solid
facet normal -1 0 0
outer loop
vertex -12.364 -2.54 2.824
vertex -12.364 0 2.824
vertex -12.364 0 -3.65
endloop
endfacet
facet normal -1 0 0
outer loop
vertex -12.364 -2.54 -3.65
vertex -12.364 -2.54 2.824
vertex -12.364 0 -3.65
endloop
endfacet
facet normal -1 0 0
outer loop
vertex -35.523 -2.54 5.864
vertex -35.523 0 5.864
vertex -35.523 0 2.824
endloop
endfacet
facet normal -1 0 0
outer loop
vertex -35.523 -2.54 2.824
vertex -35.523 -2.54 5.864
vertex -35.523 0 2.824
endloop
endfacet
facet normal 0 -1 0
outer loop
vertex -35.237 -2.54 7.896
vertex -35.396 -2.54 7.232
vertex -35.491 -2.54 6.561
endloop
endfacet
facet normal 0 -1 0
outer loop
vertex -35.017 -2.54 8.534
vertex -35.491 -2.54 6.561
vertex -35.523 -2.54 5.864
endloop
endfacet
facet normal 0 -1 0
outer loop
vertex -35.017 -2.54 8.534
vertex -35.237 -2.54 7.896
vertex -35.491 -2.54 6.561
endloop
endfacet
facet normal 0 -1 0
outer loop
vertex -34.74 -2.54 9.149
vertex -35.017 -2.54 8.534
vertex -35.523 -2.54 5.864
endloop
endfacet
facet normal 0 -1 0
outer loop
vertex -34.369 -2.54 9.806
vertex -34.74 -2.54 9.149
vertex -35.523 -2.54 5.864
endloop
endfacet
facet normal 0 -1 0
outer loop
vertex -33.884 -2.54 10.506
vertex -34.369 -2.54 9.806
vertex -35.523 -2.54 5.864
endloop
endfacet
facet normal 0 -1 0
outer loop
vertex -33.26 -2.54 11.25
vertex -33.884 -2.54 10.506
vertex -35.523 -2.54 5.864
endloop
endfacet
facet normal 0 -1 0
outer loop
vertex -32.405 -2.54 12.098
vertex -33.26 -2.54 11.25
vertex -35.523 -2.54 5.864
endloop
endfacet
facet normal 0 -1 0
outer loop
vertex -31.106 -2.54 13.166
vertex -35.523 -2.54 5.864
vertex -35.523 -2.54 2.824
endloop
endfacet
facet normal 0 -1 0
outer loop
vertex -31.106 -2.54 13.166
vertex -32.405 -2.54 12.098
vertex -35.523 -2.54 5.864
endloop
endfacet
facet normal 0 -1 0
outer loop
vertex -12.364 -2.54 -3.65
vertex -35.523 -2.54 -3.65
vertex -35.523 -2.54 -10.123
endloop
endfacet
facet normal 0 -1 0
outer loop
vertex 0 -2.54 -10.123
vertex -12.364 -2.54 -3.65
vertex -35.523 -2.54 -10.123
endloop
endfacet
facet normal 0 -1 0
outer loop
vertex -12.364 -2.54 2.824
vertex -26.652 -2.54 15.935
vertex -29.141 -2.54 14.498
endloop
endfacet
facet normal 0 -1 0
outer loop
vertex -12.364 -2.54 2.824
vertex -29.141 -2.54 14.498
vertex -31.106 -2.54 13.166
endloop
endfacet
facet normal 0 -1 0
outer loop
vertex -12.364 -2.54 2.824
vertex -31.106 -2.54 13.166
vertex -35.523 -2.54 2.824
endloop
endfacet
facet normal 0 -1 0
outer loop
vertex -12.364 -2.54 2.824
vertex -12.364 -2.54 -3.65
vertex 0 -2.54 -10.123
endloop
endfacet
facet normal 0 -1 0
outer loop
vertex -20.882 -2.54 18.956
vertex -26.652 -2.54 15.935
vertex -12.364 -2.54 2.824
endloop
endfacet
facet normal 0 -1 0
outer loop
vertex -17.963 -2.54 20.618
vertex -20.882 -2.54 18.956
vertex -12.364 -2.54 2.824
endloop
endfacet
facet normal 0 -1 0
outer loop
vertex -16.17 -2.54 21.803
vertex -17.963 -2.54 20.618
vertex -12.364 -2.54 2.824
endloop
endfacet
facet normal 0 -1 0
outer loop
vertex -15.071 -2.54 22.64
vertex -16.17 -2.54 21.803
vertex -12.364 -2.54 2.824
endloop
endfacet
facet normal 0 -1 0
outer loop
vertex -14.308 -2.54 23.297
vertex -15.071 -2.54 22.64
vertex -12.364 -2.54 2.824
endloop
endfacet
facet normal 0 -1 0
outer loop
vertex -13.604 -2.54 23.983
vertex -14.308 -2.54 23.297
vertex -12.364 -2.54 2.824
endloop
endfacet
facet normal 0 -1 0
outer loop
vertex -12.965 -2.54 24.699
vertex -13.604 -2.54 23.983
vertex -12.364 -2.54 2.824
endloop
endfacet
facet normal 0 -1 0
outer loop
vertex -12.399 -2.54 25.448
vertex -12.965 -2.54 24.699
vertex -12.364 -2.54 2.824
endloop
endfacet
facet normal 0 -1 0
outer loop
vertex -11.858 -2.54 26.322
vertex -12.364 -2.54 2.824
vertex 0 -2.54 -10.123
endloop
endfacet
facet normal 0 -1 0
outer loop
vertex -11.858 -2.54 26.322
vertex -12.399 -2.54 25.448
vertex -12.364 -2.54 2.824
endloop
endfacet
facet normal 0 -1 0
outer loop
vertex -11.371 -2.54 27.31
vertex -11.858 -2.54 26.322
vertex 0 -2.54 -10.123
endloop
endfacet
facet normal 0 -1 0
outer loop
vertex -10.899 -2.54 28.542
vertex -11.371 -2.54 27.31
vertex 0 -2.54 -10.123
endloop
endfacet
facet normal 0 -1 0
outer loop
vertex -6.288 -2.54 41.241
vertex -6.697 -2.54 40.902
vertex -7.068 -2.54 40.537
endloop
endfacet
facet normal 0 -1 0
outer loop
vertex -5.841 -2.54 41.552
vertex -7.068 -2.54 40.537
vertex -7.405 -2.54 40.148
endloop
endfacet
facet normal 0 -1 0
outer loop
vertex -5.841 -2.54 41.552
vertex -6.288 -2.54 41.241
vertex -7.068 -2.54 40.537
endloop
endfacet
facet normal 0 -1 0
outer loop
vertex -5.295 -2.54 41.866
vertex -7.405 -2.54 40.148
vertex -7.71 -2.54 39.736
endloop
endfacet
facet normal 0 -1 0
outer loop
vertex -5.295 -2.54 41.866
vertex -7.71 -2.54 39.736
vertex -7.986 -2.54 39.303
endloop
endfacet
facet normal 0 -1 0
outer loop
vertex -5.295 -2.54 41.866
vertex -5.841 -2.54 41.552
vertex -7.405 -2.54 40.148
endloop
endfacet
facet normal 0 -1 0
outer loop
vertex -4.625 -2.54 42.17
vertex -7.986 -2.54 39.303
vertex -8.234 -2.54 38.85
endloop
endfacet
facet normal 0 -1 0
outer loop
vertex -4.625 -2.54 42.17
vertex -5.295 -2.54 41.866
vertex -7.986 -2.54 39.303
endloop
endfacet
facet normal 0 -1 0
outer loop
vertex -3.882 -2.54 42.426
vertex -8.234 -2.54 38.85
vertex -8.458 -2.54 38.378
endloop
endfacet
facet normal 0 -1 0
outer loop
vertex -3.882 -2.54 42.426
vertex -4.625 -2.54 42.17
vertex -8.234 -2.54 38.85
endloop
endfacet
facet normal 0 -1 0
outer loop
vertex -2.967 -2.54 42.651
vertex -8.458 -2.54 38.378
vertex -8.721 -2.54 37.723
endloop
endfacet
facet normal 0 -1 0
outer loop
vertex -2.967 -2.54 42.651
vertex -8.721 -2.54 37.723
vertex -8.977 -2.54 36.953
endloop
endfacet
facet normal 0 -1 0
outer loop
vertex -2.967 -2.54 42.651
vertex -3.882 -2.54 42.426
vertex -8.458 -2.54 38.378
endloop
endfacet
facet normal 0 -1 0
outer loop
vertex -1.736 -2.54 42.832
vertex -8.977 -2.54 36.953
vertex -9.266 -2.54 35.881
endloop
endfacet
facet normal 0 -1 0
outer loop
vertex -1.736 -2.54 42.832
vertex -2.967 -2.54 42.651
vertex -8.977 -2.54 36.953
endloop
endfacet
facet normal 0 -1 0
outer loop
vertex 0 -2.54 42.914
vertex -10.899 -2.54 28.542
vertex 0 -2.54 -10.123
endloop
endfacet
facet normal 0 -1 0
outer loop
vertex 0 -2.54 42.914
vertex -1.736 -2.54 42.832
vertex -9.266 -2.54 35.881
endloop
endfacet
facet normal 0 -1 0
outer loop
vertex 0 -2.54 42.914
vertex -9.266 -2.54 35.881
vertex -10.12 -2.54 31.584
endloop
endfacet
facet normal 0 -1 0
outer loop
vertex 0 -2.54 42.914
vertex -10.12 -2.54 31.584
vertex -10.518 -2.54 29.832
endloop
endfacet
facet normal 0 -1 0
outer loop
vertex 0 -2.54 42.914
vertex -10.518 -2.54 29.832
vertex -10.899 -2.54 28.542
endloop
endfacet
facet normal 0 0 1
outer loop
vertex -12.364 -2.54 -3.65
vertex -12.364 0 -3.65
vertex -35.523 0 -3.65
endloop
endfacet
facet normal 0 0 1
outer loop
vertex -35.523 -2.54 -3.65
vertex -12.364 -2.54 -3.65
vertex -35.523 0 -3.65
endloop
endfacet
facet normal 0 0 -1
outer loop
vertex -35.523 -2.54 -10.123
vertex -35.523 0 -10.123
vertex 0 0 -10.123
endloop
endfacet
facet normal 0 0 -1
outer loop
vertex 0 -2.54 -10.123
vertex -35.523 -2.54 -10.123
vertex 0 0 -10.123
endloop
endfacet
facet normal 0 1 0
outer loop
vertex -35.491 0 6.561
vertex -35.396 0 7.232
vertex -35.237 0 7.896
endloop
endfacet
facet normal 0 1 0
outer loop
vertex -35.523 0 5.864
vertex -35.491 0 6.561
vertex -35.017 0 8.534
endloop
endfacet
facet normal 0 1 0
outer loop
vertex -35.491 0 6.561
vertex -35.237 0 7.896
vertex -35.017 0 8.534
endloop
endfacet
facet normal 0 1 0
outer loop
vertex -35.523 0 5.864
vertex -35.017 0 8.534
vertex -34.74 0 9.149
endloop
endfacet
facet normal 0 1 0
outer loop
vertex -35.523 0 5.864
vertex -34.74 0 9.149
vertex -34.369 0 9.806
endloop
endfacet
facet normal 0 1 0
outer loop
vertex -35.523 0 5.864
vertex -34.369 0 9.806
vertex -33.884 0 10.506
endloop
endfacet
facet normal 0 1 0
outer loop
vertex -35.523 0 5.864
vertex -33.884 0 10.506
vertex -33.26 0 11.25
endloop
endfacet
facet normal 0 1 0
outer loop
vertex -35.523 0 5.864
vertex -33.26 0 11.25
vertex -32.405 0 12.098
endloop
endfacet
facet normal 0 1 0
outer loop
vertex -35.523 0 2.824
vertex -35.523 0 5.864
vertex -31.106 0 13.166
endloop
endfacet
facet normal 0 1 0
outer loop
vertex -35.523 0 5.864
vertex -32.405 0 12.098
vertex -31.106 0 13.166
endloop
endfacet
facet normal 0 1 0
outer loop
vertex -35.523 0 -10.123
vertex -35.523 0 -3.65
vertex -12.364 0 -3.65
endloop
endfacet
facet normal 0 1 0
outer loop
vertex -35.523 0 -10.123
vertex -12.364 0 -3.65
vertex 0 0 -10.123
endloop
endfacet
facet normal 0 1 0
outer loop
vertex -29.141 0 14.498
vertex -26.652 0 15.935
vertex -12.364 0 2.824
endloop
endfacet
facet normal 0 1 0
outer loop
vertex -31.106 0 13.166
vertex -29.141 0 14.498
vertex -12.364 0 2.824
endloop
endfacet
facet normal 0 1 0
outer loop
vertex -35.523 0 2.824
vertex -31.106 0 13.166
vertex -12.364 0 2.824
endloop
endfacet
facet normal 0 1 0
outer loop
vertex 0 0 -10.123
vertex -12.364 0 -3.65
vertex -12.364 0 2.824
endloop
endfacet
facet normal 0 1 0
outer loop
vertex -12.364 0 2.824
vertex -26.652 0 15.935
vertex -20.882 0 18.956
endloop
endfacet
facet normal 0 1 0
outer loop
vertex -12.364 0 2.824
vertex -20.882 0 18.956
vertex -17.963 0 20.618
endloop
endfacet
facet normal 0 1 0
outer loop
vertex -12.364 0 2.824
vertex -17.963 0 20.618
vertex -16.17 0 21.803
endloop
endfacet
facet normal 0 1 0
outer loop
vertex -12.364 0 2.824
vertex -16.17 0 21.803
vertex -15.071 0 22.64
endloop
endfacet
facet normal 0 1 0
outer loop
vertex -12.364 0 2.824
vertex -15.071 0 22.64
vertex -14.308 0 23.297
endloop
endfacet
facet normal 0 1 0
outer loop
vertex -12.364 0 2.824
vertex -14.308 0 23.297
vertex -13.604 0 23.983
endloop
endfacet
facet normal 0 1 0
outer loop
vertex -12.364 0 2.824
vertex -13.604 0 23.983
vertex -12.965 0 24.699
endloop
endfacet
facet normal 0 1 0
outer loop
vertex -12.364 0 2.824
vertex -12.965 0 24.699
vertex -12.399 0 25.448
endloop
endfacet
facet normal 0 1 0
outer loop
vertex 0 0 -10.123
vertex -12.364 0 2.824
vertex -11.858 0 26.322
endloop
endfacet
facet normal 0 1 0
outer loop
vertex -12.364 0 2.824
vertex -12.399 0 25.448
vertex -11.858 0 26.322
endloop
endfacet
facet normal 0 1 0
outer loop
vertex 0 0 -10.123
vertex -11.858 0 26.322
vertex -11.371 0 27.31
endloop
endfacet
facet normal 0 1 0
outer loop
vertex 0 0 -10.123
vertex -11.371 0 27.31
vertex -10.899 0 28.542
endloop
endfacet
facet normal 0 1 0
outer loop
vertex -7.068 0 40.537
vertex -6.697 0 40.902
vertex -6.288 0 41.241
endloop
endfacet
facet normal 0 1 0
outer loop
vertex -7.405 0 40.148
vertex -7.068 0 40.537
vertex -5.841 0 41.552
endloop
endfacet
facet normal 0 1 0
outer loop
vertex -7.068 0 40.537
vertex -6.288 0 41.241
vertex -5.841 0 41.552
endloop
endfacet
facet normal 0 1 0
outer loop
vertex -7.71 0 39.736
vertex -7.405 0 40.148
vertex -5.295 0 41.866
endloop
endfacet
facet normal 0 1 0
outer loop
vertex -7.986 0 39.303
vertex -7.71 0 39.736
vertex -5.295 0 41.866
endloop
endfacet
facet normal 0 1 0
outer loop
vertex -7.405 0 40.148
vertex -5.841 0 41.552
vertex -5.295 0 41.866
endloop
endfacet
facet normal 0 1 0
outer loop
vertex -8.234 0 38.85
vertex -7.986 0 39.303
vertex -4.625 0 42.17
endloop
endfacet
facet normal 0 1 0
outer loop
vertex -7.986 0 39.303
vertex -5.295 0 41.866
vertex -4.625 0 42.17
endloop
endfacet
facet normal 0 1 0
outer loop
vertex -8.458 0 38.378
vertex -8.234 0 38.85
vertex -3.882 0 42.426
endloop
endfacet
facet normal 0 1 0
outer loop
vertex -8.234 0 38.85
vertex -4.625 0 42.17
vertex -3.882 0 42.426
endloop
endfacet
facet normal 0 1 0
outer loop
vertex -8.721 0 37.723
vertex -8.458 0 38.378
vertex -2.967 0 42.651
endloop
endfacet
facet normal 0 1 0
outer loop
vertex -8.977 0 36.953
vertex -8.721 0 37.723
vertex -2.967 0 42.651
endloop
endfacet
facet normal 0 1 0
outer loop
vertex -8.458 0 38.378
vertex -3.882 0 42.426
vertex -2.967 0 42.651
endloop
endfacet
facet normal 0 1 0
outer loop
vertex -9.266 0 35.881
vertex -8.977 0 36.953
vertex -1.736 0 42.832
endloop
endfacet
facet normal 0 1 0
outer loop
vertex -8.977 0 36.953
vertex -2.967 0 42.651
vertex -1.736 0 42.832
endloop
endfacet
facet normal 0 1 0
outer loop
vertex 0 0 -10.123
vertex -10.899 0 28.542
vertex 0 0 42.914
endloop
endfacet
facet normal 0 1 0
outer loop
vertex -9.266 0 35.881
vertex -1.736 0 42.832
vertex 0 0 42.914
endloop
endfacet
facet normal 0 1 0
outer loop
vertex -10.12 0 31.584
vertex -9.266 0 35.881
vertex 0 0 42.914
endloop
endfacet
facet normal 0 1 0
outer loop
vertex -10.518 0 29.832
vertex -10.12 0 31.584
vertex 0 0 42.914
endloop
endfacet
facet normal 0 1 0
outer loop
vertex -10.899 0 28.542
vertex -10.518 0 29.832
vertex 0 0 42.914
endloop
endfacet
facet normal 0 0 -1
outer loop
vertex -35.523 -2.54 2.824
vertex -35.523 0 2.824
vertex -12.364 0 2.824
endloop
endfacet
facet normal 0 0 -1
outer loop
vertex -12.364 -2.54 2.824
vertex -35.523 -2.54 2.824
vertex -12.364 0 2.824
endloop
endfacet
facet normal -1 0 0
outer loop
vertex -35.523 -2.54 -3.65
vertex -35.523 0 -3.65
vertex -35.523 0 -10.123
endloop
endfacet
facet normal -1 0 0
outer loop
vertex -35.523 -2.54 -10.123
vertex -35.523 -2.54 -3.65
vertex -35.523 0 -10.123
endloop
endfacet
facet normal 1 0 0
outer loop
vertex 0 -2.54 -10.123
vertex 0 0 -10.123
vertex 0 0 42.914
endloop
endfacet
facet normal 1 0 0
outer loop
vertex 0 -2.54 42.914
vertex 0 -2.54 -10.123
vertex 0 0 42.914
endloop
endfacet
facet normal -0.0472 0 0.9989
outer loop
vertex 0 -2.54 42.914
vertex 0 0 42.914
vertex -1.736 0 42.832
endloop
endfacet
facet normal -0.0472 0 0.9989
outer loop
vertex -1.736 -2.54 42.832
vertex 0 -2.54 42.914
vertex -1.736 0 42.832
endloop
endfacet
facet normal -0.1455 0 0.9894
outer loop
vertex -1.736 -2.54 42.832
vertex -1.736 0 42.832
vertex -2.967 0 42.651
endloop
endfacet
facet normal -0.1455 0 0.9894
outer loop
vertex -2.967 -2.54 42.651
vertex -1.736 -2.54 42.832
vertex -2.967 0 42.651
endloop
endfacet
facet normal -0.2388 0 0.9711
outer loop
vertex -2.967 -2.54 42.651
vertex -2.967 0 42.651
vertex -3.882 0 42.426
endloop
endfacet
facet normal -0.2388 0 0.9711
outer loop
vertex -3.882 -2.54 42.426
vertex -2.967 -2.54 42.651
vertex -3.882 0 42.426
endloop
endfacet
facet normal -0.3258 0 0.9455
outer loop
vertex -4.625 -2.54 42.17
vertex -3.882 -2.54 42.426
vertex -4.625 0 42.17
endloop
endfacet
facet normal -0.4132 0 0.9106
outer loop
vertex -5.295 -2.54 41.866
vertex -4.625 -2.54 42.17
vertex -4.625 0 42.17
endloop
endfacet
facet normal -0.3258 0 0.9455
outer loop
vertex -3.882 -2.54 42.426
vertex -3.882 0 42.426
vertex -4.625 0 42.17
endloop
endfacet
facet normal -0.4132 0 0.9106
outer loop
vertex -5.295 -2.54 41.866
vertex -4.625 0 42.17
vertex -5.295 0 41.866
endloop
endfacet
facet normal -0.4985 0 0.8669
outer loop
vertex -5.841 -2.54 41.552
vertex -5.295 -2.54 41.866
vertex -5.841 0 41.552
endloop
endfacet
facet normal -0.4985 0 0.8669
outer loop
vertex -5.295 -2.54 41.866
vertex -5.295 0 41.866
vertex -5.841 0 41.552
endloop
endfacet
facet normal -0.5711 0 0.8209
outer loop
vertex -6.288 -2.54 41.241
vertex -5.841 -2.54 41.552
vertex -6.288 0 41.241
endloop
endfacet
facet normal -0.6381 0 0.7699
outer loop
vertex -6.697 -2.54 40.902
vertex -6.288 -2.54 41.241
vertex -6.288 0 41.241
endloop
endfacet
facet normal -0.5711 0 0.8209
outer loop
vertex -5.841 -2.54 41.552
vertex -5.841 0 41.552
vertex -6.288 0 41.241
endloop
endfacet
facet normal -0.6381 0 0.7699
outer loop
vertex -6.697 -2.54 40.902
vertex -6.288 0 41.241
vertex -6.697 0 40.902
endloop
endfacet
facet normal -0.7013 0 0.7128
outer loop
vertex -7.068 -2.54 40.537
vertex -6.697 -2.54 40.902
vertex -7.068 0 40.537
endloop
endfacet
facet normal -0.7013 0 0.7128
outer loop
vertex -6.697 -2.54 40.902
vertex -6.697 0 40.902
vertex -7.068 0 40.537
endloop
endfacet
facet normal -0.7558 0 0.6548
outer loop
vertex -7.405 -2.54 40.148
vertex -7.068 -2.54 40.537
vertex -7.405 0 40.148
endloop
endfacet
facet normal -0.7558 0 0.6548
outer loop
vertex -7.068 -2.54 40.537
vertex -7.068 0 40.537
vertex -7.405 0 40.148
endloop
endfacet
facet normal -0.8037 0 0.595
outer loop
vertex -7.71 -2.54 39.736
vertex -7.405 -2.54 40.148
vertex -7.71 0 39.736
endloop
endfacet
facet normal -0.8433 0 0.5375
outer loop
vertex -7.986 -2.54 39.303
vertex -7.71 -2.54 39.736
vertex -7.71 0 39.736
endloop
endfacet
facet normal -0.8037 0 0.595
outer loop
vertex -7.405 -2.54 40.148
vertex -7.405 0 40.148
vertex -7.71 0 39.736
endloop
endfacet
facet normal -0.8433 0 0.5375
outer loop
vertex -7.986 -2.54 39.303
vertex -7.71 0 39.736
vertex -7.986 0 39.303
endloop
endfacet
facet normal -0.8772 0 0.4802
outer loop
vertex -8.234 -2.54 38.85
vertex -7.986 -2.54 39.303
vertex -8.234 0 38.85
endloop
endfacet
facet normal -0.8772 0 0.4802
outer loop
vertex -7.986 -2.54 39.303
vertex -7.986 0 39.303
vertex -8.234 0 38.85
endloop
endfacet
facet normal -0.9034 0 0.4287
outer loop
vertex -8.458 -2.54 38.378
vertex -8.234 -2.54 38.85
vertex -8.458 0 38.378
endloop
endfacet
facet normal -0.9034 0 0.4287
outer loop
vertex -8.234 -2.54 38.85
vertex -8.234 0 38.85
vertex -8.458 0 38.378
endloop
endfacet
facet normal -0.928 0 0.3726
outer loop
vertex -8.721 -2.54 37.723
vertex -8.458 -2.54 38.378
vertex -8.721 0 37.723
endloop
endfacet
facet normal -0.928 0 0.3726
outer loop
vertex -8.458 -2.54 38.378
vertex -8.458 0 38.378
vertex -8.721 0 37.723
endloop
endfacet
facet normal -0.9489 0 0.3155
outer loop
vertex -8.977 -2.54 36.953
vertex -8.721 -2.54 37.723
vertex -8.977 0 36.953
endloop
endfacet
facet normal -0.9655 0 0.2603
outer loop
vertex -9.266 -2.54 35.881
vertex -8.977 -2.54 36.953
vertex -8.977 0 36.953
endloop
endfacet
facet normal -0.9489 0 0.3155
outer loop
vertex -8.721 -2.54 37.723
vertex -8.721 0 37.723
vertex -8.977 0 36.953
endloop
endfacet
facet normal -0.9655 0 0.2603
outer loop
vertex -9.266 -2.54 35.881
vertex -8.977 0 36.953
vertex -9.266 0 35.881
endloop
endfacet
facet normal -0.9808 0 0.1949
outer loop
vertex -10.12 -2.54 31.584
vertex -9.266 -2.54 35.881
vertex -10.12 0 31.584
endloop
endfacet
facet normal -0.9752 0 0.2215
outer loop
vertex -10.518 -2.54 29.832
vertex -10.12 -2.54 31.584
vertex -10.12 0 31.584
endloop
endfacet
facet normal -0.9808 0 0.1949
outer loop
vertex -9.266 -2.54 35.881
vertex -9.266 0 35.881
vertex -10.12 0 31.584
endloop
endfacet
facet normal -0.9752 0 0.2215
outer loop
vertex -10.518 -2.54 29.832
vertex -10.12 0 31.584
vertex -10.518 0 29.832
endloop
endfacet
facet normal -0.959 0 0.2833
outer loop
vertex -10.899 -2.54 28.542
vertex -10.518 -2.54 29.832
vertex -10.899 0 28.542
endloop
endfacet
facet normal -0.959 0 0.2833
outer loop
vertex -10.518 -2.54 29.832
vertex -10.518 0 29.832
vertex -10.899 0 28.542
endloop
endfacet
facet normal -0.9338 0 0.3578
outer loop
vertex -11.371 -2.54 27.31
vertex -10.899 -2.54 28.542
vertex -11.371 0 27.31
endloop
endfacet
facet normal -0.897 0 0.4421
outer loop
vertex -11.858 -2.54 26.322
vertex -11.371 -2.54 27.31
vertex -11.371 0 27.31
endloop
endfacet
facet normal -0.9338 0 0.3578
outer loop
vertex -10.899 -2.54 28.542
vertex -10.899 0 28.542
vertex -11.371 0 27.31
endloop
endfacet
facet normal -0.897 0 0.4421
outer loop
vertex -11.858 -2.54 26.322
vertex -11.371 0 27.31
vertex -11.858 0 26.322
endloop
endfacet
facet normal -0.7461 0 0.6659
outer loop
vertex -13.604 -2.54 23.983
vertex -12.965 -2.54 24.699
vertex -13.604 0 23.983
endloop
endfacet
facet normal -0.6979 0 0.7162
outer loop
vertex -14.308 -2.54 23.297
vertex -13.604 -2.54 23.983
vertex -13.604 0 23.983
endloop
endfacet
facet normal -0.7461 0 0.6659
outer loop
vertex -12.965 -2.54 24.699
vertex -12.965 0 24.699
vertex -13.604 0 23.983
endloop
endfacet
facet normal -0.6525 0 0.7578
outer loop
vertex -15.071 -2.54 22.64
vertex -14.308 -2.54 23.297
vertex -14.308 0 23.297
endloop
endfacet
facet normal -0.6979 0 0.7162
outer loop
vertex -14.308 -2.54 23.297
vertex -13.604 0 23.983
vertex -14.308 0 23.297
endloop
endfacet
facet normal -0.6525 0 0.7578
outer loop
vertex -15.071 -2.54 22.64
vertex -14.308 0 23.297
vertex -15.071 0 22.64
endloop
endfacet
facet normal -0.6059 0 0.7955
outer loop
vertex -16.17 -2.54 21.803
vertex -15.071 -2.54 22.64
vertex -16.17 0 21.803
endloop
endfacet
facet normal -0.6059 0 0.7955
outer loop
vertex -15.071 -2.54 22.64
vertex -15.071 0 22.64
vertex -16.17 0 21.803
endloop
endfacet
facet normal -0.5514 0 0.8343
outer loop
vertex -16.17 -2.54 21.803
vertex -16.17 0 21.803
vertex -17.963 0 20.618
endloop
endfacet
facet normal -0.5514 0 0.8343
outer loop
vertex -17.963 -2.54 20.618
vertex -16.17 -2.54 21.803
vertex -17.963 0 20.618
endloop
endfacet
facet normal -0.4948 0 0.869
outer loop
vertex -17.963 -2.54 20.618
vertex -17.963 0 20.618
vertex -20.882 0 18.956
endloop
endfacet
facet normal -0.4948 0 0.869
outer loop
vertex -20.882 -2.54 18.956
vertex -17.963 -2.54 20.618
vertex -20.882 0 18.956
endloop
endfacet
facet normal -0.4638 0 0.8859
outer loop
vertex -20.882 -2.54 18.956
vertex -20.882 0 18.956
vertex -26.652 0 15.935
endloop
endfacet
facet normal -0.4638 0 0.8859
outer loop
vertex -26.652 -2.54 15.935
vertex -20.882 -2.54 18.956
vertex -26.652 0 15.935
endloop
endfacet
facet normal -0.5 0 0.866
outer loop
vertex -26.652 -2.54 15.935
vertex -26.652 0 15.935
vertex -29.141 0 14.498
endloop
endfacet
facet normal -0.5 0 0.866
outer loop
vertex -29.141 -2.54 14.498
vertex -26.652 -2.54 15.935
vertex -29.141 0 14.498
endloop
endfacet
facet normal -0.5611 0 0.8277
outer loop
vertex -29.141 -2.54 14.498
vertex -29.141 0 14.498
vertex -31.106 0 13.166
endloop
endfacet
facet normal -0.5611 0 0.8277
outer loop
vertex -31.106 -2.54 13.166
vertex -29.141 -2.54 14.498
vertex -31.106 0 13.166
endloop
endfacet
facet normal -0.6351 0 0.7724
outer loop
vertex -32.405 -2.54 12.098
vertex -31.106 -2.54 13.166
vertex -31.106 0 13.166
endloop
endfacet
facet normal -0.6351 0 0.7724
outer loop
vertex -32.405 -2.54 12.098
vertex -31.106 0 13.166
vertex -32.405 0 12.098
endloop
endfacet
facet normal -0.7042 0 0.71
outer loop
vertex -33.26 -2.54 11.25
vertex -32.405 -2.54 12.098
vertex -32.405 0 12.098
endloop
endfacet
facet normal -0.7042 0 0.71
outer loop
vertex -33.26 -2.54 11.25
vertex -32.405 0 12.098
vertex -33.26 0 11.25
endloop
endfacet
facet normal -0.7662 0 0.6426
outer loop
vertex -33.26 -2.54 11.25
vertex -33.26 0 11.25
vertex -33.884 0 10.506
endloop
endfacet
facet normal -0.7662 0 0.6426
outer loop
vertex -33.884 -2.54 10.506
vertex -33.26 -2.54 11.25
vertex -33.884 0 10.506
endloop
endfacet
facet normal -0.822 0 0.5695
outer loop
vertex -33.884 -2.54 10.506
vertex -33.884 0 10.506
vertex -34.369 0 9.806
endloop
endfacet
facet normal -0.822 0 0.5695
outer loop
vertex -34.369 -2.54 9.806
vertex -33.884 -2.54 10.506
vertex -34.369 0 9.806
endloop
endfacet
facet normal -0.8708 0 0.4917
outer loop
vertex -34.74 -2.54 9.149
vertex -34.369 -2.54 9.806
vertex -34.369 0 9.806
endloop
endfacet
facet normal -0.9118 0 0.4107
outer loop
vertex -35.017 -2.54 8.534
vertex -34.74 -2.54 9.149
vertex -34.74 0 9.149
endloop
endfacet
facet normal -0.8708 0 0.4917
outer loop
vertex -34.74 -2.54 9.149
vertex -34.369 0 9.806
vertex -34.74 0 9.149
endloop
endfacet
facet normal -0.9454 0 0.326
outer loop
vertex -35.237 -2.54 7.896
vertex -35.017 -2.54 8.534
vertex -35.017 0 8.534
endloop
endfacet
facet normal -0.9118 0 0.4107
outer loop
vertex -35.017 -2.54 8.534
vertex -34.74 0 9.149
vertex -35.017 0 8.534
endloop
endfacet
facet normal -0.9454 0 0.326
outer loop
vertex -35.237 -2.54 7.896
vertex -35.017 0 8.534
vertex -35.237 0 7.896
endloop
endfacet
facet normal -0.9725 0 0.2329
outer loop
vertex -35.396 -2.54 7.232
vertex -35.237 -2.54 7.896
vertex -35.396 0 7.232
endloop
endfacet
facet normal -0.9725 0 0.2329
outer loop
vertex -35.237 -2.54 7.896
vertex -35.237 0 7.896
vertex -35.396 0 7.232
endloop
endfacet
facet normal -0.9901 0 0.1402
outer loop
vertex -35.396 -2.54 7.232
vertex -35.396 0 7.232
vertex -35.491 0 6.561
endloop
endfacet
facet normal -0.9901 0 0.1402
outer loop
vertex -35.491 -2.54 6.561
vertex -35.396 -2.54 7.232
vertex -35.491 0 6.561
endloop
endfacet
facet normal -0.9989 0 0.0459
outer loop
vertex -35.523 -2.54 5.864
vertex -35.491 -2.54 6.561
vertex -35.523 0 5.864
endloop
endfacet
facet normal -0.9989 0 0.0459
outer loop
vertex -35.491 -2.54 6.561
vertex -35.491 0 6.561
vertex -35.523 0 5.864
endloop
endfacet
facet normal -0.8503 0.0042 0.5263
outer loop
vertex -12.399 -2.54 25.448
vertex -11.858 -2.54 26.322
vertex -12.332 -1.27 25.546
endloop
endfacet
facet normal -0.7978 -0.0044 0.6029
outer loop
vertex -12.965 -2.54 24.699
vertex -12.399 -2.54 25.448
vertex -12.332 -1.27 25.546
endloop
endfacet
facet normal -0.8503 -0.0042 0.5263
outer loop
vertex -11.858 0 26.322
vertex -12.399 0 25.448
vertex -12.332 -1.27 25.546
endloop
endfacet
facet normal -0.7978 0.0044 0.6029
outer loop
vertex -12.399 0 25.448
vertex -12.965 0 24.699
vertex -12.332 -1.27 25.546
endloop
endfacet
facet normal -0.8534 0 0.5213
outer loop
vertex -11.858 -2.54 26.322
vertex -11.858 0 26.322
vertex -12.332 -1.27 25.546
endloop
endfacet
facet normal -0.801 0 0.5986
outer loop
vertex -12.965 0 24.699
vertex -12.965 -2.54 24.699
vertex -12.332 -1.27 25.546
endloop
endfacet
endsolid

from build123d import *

# Parameters (mm, degrees)
F1_DEPTH = 2.54


with BuildPart() as f1:
    # F0 (on Front) → F1 (new body)
    with BuildSketch(Plane.XZ):
        with BuildLine():
            Line((0, -10.1231690496), (0, 42.9135896266))
            add(Edge.make_bspline(
                [(0, 42.9135896266), (-12.1476806197, 42.9135896266), (-2.739209771, 19.3897308122), (-35.5233164852, 15.458070993), (-35.5233164852, 5.8638730506)],
                knots=[0, 0, 0, 0, 0.4555847707, 1, 1, 1, 1], degree=3))
            Line((-35.5233164852, 5.8638730506), (-35.5233164852, 2.8238131199))
            Line((-35.5233164852, 2.8238131199), (-12.3643353581, 2.8238131199))
            Line((-12.3643353581, 2.8238131199), (-12.3643353581, -3.6496780813))
            Line((-12.3643353581, -3.6496780813), (-35.5233164852, -3.6496780813))
            Line((-35.5233164852, -3.6496780813), (-35.5233164852, -10.1231690496))
            Line((-35.5233164852, -10.1231690496), (0, -10.1231690496))
        make_face()
    extrude(amount=F1_DEPTH)


solid = f1.part
